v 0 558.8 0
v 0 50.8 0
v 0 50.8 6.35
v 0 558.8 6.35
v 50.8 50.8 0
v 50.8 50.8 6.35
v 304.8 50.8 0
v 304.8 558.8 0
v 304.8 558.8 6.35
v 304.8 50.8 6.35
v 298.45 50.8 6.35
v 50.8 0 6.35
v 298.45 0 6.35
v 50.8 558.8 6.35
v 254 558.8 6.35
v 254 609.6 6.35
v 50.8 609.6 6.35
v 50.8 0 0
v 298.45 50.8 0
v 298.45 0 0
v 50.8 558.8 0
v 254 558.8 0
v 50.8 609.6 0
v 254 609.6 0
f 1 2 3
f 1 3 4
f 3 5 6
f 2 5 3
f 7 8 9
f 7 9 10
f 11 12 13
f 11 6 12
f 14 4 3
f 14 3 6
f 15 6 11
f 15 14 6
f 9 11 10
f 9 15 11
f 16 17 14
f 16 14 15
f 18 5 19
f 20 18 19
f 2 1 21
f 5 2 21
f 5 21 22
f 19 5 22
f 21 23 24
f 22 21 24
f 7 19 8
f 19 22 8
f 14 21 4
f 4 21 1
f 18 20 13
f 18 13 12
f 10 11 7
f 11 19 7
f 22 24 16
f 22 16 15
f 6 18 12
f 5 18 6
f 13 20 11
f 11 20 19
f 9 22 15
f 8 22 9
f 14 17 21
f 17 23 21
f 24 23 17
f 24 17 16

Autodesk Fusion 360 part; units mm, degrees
sketch "Sketch1" plane through (0, 0, 0) normal (0, 0, 1) x (1, 0, 0)
  line L0 (0, 0) -> (0, 609.6)
  line L1 (0, 609.6) -> (304.8, 609.6)
  line L2 (304.8, 609.6) -> (304.8, 0)
  line L3 (304.8, 0) -> (0, 0)
  line L4 (0, 0) -> (50.8, 0)
  line L5 (50.8, 0) -> (50.8, 50.8)
  line L6 (50.8, 50.8) -> (0, 50.8)
  line L7 (0, 50.8) -> (0, 0)
  line L8 (0, 609.6) -> (50.8, 609.6)
  line L9 (50.8, 609.6) -> (50.8, 558.8)
  line L10 (50.8, 558.8) -> (0, 558.8)
  line L11 (0, 558.8) -> (0, 609.6)
  line L12 (304.8, 609.6) -> (254, 609.6)
  line L13 (254, 609.6) -> (254, 558.8)
  line L14 (254, 558.8) -> (304.8, 558.8)
  line L15 (304.8, 558.8) -> (304.8, 609.6)
  line L16 (304.8, 0) -> (298.45, 0)
  line L17 (298.45, 0) -> (298.45, 50.8)
  line L18 (298.45, 50.8) -> (304.8, 50.8)
  line L19 (304.8, 50.8) -> (304.8, 0)
  dimension "d2" = 609.6
  dimension "d3" = 304.8
  dimension "d10" = 50.8
  dimension "d11" = 50.8
  dimension "d12" = 50.8
  dimension "d13" = 50.8
  dimension "d14" = 6.35
  dimension "d16" = 304.8
extrude "Extrude1" add sketch "Sketch1" along normal blind 6.35 contours L0 L1 L2 L3 L5 L6 L9 L10 L13 L14 L17 L18
